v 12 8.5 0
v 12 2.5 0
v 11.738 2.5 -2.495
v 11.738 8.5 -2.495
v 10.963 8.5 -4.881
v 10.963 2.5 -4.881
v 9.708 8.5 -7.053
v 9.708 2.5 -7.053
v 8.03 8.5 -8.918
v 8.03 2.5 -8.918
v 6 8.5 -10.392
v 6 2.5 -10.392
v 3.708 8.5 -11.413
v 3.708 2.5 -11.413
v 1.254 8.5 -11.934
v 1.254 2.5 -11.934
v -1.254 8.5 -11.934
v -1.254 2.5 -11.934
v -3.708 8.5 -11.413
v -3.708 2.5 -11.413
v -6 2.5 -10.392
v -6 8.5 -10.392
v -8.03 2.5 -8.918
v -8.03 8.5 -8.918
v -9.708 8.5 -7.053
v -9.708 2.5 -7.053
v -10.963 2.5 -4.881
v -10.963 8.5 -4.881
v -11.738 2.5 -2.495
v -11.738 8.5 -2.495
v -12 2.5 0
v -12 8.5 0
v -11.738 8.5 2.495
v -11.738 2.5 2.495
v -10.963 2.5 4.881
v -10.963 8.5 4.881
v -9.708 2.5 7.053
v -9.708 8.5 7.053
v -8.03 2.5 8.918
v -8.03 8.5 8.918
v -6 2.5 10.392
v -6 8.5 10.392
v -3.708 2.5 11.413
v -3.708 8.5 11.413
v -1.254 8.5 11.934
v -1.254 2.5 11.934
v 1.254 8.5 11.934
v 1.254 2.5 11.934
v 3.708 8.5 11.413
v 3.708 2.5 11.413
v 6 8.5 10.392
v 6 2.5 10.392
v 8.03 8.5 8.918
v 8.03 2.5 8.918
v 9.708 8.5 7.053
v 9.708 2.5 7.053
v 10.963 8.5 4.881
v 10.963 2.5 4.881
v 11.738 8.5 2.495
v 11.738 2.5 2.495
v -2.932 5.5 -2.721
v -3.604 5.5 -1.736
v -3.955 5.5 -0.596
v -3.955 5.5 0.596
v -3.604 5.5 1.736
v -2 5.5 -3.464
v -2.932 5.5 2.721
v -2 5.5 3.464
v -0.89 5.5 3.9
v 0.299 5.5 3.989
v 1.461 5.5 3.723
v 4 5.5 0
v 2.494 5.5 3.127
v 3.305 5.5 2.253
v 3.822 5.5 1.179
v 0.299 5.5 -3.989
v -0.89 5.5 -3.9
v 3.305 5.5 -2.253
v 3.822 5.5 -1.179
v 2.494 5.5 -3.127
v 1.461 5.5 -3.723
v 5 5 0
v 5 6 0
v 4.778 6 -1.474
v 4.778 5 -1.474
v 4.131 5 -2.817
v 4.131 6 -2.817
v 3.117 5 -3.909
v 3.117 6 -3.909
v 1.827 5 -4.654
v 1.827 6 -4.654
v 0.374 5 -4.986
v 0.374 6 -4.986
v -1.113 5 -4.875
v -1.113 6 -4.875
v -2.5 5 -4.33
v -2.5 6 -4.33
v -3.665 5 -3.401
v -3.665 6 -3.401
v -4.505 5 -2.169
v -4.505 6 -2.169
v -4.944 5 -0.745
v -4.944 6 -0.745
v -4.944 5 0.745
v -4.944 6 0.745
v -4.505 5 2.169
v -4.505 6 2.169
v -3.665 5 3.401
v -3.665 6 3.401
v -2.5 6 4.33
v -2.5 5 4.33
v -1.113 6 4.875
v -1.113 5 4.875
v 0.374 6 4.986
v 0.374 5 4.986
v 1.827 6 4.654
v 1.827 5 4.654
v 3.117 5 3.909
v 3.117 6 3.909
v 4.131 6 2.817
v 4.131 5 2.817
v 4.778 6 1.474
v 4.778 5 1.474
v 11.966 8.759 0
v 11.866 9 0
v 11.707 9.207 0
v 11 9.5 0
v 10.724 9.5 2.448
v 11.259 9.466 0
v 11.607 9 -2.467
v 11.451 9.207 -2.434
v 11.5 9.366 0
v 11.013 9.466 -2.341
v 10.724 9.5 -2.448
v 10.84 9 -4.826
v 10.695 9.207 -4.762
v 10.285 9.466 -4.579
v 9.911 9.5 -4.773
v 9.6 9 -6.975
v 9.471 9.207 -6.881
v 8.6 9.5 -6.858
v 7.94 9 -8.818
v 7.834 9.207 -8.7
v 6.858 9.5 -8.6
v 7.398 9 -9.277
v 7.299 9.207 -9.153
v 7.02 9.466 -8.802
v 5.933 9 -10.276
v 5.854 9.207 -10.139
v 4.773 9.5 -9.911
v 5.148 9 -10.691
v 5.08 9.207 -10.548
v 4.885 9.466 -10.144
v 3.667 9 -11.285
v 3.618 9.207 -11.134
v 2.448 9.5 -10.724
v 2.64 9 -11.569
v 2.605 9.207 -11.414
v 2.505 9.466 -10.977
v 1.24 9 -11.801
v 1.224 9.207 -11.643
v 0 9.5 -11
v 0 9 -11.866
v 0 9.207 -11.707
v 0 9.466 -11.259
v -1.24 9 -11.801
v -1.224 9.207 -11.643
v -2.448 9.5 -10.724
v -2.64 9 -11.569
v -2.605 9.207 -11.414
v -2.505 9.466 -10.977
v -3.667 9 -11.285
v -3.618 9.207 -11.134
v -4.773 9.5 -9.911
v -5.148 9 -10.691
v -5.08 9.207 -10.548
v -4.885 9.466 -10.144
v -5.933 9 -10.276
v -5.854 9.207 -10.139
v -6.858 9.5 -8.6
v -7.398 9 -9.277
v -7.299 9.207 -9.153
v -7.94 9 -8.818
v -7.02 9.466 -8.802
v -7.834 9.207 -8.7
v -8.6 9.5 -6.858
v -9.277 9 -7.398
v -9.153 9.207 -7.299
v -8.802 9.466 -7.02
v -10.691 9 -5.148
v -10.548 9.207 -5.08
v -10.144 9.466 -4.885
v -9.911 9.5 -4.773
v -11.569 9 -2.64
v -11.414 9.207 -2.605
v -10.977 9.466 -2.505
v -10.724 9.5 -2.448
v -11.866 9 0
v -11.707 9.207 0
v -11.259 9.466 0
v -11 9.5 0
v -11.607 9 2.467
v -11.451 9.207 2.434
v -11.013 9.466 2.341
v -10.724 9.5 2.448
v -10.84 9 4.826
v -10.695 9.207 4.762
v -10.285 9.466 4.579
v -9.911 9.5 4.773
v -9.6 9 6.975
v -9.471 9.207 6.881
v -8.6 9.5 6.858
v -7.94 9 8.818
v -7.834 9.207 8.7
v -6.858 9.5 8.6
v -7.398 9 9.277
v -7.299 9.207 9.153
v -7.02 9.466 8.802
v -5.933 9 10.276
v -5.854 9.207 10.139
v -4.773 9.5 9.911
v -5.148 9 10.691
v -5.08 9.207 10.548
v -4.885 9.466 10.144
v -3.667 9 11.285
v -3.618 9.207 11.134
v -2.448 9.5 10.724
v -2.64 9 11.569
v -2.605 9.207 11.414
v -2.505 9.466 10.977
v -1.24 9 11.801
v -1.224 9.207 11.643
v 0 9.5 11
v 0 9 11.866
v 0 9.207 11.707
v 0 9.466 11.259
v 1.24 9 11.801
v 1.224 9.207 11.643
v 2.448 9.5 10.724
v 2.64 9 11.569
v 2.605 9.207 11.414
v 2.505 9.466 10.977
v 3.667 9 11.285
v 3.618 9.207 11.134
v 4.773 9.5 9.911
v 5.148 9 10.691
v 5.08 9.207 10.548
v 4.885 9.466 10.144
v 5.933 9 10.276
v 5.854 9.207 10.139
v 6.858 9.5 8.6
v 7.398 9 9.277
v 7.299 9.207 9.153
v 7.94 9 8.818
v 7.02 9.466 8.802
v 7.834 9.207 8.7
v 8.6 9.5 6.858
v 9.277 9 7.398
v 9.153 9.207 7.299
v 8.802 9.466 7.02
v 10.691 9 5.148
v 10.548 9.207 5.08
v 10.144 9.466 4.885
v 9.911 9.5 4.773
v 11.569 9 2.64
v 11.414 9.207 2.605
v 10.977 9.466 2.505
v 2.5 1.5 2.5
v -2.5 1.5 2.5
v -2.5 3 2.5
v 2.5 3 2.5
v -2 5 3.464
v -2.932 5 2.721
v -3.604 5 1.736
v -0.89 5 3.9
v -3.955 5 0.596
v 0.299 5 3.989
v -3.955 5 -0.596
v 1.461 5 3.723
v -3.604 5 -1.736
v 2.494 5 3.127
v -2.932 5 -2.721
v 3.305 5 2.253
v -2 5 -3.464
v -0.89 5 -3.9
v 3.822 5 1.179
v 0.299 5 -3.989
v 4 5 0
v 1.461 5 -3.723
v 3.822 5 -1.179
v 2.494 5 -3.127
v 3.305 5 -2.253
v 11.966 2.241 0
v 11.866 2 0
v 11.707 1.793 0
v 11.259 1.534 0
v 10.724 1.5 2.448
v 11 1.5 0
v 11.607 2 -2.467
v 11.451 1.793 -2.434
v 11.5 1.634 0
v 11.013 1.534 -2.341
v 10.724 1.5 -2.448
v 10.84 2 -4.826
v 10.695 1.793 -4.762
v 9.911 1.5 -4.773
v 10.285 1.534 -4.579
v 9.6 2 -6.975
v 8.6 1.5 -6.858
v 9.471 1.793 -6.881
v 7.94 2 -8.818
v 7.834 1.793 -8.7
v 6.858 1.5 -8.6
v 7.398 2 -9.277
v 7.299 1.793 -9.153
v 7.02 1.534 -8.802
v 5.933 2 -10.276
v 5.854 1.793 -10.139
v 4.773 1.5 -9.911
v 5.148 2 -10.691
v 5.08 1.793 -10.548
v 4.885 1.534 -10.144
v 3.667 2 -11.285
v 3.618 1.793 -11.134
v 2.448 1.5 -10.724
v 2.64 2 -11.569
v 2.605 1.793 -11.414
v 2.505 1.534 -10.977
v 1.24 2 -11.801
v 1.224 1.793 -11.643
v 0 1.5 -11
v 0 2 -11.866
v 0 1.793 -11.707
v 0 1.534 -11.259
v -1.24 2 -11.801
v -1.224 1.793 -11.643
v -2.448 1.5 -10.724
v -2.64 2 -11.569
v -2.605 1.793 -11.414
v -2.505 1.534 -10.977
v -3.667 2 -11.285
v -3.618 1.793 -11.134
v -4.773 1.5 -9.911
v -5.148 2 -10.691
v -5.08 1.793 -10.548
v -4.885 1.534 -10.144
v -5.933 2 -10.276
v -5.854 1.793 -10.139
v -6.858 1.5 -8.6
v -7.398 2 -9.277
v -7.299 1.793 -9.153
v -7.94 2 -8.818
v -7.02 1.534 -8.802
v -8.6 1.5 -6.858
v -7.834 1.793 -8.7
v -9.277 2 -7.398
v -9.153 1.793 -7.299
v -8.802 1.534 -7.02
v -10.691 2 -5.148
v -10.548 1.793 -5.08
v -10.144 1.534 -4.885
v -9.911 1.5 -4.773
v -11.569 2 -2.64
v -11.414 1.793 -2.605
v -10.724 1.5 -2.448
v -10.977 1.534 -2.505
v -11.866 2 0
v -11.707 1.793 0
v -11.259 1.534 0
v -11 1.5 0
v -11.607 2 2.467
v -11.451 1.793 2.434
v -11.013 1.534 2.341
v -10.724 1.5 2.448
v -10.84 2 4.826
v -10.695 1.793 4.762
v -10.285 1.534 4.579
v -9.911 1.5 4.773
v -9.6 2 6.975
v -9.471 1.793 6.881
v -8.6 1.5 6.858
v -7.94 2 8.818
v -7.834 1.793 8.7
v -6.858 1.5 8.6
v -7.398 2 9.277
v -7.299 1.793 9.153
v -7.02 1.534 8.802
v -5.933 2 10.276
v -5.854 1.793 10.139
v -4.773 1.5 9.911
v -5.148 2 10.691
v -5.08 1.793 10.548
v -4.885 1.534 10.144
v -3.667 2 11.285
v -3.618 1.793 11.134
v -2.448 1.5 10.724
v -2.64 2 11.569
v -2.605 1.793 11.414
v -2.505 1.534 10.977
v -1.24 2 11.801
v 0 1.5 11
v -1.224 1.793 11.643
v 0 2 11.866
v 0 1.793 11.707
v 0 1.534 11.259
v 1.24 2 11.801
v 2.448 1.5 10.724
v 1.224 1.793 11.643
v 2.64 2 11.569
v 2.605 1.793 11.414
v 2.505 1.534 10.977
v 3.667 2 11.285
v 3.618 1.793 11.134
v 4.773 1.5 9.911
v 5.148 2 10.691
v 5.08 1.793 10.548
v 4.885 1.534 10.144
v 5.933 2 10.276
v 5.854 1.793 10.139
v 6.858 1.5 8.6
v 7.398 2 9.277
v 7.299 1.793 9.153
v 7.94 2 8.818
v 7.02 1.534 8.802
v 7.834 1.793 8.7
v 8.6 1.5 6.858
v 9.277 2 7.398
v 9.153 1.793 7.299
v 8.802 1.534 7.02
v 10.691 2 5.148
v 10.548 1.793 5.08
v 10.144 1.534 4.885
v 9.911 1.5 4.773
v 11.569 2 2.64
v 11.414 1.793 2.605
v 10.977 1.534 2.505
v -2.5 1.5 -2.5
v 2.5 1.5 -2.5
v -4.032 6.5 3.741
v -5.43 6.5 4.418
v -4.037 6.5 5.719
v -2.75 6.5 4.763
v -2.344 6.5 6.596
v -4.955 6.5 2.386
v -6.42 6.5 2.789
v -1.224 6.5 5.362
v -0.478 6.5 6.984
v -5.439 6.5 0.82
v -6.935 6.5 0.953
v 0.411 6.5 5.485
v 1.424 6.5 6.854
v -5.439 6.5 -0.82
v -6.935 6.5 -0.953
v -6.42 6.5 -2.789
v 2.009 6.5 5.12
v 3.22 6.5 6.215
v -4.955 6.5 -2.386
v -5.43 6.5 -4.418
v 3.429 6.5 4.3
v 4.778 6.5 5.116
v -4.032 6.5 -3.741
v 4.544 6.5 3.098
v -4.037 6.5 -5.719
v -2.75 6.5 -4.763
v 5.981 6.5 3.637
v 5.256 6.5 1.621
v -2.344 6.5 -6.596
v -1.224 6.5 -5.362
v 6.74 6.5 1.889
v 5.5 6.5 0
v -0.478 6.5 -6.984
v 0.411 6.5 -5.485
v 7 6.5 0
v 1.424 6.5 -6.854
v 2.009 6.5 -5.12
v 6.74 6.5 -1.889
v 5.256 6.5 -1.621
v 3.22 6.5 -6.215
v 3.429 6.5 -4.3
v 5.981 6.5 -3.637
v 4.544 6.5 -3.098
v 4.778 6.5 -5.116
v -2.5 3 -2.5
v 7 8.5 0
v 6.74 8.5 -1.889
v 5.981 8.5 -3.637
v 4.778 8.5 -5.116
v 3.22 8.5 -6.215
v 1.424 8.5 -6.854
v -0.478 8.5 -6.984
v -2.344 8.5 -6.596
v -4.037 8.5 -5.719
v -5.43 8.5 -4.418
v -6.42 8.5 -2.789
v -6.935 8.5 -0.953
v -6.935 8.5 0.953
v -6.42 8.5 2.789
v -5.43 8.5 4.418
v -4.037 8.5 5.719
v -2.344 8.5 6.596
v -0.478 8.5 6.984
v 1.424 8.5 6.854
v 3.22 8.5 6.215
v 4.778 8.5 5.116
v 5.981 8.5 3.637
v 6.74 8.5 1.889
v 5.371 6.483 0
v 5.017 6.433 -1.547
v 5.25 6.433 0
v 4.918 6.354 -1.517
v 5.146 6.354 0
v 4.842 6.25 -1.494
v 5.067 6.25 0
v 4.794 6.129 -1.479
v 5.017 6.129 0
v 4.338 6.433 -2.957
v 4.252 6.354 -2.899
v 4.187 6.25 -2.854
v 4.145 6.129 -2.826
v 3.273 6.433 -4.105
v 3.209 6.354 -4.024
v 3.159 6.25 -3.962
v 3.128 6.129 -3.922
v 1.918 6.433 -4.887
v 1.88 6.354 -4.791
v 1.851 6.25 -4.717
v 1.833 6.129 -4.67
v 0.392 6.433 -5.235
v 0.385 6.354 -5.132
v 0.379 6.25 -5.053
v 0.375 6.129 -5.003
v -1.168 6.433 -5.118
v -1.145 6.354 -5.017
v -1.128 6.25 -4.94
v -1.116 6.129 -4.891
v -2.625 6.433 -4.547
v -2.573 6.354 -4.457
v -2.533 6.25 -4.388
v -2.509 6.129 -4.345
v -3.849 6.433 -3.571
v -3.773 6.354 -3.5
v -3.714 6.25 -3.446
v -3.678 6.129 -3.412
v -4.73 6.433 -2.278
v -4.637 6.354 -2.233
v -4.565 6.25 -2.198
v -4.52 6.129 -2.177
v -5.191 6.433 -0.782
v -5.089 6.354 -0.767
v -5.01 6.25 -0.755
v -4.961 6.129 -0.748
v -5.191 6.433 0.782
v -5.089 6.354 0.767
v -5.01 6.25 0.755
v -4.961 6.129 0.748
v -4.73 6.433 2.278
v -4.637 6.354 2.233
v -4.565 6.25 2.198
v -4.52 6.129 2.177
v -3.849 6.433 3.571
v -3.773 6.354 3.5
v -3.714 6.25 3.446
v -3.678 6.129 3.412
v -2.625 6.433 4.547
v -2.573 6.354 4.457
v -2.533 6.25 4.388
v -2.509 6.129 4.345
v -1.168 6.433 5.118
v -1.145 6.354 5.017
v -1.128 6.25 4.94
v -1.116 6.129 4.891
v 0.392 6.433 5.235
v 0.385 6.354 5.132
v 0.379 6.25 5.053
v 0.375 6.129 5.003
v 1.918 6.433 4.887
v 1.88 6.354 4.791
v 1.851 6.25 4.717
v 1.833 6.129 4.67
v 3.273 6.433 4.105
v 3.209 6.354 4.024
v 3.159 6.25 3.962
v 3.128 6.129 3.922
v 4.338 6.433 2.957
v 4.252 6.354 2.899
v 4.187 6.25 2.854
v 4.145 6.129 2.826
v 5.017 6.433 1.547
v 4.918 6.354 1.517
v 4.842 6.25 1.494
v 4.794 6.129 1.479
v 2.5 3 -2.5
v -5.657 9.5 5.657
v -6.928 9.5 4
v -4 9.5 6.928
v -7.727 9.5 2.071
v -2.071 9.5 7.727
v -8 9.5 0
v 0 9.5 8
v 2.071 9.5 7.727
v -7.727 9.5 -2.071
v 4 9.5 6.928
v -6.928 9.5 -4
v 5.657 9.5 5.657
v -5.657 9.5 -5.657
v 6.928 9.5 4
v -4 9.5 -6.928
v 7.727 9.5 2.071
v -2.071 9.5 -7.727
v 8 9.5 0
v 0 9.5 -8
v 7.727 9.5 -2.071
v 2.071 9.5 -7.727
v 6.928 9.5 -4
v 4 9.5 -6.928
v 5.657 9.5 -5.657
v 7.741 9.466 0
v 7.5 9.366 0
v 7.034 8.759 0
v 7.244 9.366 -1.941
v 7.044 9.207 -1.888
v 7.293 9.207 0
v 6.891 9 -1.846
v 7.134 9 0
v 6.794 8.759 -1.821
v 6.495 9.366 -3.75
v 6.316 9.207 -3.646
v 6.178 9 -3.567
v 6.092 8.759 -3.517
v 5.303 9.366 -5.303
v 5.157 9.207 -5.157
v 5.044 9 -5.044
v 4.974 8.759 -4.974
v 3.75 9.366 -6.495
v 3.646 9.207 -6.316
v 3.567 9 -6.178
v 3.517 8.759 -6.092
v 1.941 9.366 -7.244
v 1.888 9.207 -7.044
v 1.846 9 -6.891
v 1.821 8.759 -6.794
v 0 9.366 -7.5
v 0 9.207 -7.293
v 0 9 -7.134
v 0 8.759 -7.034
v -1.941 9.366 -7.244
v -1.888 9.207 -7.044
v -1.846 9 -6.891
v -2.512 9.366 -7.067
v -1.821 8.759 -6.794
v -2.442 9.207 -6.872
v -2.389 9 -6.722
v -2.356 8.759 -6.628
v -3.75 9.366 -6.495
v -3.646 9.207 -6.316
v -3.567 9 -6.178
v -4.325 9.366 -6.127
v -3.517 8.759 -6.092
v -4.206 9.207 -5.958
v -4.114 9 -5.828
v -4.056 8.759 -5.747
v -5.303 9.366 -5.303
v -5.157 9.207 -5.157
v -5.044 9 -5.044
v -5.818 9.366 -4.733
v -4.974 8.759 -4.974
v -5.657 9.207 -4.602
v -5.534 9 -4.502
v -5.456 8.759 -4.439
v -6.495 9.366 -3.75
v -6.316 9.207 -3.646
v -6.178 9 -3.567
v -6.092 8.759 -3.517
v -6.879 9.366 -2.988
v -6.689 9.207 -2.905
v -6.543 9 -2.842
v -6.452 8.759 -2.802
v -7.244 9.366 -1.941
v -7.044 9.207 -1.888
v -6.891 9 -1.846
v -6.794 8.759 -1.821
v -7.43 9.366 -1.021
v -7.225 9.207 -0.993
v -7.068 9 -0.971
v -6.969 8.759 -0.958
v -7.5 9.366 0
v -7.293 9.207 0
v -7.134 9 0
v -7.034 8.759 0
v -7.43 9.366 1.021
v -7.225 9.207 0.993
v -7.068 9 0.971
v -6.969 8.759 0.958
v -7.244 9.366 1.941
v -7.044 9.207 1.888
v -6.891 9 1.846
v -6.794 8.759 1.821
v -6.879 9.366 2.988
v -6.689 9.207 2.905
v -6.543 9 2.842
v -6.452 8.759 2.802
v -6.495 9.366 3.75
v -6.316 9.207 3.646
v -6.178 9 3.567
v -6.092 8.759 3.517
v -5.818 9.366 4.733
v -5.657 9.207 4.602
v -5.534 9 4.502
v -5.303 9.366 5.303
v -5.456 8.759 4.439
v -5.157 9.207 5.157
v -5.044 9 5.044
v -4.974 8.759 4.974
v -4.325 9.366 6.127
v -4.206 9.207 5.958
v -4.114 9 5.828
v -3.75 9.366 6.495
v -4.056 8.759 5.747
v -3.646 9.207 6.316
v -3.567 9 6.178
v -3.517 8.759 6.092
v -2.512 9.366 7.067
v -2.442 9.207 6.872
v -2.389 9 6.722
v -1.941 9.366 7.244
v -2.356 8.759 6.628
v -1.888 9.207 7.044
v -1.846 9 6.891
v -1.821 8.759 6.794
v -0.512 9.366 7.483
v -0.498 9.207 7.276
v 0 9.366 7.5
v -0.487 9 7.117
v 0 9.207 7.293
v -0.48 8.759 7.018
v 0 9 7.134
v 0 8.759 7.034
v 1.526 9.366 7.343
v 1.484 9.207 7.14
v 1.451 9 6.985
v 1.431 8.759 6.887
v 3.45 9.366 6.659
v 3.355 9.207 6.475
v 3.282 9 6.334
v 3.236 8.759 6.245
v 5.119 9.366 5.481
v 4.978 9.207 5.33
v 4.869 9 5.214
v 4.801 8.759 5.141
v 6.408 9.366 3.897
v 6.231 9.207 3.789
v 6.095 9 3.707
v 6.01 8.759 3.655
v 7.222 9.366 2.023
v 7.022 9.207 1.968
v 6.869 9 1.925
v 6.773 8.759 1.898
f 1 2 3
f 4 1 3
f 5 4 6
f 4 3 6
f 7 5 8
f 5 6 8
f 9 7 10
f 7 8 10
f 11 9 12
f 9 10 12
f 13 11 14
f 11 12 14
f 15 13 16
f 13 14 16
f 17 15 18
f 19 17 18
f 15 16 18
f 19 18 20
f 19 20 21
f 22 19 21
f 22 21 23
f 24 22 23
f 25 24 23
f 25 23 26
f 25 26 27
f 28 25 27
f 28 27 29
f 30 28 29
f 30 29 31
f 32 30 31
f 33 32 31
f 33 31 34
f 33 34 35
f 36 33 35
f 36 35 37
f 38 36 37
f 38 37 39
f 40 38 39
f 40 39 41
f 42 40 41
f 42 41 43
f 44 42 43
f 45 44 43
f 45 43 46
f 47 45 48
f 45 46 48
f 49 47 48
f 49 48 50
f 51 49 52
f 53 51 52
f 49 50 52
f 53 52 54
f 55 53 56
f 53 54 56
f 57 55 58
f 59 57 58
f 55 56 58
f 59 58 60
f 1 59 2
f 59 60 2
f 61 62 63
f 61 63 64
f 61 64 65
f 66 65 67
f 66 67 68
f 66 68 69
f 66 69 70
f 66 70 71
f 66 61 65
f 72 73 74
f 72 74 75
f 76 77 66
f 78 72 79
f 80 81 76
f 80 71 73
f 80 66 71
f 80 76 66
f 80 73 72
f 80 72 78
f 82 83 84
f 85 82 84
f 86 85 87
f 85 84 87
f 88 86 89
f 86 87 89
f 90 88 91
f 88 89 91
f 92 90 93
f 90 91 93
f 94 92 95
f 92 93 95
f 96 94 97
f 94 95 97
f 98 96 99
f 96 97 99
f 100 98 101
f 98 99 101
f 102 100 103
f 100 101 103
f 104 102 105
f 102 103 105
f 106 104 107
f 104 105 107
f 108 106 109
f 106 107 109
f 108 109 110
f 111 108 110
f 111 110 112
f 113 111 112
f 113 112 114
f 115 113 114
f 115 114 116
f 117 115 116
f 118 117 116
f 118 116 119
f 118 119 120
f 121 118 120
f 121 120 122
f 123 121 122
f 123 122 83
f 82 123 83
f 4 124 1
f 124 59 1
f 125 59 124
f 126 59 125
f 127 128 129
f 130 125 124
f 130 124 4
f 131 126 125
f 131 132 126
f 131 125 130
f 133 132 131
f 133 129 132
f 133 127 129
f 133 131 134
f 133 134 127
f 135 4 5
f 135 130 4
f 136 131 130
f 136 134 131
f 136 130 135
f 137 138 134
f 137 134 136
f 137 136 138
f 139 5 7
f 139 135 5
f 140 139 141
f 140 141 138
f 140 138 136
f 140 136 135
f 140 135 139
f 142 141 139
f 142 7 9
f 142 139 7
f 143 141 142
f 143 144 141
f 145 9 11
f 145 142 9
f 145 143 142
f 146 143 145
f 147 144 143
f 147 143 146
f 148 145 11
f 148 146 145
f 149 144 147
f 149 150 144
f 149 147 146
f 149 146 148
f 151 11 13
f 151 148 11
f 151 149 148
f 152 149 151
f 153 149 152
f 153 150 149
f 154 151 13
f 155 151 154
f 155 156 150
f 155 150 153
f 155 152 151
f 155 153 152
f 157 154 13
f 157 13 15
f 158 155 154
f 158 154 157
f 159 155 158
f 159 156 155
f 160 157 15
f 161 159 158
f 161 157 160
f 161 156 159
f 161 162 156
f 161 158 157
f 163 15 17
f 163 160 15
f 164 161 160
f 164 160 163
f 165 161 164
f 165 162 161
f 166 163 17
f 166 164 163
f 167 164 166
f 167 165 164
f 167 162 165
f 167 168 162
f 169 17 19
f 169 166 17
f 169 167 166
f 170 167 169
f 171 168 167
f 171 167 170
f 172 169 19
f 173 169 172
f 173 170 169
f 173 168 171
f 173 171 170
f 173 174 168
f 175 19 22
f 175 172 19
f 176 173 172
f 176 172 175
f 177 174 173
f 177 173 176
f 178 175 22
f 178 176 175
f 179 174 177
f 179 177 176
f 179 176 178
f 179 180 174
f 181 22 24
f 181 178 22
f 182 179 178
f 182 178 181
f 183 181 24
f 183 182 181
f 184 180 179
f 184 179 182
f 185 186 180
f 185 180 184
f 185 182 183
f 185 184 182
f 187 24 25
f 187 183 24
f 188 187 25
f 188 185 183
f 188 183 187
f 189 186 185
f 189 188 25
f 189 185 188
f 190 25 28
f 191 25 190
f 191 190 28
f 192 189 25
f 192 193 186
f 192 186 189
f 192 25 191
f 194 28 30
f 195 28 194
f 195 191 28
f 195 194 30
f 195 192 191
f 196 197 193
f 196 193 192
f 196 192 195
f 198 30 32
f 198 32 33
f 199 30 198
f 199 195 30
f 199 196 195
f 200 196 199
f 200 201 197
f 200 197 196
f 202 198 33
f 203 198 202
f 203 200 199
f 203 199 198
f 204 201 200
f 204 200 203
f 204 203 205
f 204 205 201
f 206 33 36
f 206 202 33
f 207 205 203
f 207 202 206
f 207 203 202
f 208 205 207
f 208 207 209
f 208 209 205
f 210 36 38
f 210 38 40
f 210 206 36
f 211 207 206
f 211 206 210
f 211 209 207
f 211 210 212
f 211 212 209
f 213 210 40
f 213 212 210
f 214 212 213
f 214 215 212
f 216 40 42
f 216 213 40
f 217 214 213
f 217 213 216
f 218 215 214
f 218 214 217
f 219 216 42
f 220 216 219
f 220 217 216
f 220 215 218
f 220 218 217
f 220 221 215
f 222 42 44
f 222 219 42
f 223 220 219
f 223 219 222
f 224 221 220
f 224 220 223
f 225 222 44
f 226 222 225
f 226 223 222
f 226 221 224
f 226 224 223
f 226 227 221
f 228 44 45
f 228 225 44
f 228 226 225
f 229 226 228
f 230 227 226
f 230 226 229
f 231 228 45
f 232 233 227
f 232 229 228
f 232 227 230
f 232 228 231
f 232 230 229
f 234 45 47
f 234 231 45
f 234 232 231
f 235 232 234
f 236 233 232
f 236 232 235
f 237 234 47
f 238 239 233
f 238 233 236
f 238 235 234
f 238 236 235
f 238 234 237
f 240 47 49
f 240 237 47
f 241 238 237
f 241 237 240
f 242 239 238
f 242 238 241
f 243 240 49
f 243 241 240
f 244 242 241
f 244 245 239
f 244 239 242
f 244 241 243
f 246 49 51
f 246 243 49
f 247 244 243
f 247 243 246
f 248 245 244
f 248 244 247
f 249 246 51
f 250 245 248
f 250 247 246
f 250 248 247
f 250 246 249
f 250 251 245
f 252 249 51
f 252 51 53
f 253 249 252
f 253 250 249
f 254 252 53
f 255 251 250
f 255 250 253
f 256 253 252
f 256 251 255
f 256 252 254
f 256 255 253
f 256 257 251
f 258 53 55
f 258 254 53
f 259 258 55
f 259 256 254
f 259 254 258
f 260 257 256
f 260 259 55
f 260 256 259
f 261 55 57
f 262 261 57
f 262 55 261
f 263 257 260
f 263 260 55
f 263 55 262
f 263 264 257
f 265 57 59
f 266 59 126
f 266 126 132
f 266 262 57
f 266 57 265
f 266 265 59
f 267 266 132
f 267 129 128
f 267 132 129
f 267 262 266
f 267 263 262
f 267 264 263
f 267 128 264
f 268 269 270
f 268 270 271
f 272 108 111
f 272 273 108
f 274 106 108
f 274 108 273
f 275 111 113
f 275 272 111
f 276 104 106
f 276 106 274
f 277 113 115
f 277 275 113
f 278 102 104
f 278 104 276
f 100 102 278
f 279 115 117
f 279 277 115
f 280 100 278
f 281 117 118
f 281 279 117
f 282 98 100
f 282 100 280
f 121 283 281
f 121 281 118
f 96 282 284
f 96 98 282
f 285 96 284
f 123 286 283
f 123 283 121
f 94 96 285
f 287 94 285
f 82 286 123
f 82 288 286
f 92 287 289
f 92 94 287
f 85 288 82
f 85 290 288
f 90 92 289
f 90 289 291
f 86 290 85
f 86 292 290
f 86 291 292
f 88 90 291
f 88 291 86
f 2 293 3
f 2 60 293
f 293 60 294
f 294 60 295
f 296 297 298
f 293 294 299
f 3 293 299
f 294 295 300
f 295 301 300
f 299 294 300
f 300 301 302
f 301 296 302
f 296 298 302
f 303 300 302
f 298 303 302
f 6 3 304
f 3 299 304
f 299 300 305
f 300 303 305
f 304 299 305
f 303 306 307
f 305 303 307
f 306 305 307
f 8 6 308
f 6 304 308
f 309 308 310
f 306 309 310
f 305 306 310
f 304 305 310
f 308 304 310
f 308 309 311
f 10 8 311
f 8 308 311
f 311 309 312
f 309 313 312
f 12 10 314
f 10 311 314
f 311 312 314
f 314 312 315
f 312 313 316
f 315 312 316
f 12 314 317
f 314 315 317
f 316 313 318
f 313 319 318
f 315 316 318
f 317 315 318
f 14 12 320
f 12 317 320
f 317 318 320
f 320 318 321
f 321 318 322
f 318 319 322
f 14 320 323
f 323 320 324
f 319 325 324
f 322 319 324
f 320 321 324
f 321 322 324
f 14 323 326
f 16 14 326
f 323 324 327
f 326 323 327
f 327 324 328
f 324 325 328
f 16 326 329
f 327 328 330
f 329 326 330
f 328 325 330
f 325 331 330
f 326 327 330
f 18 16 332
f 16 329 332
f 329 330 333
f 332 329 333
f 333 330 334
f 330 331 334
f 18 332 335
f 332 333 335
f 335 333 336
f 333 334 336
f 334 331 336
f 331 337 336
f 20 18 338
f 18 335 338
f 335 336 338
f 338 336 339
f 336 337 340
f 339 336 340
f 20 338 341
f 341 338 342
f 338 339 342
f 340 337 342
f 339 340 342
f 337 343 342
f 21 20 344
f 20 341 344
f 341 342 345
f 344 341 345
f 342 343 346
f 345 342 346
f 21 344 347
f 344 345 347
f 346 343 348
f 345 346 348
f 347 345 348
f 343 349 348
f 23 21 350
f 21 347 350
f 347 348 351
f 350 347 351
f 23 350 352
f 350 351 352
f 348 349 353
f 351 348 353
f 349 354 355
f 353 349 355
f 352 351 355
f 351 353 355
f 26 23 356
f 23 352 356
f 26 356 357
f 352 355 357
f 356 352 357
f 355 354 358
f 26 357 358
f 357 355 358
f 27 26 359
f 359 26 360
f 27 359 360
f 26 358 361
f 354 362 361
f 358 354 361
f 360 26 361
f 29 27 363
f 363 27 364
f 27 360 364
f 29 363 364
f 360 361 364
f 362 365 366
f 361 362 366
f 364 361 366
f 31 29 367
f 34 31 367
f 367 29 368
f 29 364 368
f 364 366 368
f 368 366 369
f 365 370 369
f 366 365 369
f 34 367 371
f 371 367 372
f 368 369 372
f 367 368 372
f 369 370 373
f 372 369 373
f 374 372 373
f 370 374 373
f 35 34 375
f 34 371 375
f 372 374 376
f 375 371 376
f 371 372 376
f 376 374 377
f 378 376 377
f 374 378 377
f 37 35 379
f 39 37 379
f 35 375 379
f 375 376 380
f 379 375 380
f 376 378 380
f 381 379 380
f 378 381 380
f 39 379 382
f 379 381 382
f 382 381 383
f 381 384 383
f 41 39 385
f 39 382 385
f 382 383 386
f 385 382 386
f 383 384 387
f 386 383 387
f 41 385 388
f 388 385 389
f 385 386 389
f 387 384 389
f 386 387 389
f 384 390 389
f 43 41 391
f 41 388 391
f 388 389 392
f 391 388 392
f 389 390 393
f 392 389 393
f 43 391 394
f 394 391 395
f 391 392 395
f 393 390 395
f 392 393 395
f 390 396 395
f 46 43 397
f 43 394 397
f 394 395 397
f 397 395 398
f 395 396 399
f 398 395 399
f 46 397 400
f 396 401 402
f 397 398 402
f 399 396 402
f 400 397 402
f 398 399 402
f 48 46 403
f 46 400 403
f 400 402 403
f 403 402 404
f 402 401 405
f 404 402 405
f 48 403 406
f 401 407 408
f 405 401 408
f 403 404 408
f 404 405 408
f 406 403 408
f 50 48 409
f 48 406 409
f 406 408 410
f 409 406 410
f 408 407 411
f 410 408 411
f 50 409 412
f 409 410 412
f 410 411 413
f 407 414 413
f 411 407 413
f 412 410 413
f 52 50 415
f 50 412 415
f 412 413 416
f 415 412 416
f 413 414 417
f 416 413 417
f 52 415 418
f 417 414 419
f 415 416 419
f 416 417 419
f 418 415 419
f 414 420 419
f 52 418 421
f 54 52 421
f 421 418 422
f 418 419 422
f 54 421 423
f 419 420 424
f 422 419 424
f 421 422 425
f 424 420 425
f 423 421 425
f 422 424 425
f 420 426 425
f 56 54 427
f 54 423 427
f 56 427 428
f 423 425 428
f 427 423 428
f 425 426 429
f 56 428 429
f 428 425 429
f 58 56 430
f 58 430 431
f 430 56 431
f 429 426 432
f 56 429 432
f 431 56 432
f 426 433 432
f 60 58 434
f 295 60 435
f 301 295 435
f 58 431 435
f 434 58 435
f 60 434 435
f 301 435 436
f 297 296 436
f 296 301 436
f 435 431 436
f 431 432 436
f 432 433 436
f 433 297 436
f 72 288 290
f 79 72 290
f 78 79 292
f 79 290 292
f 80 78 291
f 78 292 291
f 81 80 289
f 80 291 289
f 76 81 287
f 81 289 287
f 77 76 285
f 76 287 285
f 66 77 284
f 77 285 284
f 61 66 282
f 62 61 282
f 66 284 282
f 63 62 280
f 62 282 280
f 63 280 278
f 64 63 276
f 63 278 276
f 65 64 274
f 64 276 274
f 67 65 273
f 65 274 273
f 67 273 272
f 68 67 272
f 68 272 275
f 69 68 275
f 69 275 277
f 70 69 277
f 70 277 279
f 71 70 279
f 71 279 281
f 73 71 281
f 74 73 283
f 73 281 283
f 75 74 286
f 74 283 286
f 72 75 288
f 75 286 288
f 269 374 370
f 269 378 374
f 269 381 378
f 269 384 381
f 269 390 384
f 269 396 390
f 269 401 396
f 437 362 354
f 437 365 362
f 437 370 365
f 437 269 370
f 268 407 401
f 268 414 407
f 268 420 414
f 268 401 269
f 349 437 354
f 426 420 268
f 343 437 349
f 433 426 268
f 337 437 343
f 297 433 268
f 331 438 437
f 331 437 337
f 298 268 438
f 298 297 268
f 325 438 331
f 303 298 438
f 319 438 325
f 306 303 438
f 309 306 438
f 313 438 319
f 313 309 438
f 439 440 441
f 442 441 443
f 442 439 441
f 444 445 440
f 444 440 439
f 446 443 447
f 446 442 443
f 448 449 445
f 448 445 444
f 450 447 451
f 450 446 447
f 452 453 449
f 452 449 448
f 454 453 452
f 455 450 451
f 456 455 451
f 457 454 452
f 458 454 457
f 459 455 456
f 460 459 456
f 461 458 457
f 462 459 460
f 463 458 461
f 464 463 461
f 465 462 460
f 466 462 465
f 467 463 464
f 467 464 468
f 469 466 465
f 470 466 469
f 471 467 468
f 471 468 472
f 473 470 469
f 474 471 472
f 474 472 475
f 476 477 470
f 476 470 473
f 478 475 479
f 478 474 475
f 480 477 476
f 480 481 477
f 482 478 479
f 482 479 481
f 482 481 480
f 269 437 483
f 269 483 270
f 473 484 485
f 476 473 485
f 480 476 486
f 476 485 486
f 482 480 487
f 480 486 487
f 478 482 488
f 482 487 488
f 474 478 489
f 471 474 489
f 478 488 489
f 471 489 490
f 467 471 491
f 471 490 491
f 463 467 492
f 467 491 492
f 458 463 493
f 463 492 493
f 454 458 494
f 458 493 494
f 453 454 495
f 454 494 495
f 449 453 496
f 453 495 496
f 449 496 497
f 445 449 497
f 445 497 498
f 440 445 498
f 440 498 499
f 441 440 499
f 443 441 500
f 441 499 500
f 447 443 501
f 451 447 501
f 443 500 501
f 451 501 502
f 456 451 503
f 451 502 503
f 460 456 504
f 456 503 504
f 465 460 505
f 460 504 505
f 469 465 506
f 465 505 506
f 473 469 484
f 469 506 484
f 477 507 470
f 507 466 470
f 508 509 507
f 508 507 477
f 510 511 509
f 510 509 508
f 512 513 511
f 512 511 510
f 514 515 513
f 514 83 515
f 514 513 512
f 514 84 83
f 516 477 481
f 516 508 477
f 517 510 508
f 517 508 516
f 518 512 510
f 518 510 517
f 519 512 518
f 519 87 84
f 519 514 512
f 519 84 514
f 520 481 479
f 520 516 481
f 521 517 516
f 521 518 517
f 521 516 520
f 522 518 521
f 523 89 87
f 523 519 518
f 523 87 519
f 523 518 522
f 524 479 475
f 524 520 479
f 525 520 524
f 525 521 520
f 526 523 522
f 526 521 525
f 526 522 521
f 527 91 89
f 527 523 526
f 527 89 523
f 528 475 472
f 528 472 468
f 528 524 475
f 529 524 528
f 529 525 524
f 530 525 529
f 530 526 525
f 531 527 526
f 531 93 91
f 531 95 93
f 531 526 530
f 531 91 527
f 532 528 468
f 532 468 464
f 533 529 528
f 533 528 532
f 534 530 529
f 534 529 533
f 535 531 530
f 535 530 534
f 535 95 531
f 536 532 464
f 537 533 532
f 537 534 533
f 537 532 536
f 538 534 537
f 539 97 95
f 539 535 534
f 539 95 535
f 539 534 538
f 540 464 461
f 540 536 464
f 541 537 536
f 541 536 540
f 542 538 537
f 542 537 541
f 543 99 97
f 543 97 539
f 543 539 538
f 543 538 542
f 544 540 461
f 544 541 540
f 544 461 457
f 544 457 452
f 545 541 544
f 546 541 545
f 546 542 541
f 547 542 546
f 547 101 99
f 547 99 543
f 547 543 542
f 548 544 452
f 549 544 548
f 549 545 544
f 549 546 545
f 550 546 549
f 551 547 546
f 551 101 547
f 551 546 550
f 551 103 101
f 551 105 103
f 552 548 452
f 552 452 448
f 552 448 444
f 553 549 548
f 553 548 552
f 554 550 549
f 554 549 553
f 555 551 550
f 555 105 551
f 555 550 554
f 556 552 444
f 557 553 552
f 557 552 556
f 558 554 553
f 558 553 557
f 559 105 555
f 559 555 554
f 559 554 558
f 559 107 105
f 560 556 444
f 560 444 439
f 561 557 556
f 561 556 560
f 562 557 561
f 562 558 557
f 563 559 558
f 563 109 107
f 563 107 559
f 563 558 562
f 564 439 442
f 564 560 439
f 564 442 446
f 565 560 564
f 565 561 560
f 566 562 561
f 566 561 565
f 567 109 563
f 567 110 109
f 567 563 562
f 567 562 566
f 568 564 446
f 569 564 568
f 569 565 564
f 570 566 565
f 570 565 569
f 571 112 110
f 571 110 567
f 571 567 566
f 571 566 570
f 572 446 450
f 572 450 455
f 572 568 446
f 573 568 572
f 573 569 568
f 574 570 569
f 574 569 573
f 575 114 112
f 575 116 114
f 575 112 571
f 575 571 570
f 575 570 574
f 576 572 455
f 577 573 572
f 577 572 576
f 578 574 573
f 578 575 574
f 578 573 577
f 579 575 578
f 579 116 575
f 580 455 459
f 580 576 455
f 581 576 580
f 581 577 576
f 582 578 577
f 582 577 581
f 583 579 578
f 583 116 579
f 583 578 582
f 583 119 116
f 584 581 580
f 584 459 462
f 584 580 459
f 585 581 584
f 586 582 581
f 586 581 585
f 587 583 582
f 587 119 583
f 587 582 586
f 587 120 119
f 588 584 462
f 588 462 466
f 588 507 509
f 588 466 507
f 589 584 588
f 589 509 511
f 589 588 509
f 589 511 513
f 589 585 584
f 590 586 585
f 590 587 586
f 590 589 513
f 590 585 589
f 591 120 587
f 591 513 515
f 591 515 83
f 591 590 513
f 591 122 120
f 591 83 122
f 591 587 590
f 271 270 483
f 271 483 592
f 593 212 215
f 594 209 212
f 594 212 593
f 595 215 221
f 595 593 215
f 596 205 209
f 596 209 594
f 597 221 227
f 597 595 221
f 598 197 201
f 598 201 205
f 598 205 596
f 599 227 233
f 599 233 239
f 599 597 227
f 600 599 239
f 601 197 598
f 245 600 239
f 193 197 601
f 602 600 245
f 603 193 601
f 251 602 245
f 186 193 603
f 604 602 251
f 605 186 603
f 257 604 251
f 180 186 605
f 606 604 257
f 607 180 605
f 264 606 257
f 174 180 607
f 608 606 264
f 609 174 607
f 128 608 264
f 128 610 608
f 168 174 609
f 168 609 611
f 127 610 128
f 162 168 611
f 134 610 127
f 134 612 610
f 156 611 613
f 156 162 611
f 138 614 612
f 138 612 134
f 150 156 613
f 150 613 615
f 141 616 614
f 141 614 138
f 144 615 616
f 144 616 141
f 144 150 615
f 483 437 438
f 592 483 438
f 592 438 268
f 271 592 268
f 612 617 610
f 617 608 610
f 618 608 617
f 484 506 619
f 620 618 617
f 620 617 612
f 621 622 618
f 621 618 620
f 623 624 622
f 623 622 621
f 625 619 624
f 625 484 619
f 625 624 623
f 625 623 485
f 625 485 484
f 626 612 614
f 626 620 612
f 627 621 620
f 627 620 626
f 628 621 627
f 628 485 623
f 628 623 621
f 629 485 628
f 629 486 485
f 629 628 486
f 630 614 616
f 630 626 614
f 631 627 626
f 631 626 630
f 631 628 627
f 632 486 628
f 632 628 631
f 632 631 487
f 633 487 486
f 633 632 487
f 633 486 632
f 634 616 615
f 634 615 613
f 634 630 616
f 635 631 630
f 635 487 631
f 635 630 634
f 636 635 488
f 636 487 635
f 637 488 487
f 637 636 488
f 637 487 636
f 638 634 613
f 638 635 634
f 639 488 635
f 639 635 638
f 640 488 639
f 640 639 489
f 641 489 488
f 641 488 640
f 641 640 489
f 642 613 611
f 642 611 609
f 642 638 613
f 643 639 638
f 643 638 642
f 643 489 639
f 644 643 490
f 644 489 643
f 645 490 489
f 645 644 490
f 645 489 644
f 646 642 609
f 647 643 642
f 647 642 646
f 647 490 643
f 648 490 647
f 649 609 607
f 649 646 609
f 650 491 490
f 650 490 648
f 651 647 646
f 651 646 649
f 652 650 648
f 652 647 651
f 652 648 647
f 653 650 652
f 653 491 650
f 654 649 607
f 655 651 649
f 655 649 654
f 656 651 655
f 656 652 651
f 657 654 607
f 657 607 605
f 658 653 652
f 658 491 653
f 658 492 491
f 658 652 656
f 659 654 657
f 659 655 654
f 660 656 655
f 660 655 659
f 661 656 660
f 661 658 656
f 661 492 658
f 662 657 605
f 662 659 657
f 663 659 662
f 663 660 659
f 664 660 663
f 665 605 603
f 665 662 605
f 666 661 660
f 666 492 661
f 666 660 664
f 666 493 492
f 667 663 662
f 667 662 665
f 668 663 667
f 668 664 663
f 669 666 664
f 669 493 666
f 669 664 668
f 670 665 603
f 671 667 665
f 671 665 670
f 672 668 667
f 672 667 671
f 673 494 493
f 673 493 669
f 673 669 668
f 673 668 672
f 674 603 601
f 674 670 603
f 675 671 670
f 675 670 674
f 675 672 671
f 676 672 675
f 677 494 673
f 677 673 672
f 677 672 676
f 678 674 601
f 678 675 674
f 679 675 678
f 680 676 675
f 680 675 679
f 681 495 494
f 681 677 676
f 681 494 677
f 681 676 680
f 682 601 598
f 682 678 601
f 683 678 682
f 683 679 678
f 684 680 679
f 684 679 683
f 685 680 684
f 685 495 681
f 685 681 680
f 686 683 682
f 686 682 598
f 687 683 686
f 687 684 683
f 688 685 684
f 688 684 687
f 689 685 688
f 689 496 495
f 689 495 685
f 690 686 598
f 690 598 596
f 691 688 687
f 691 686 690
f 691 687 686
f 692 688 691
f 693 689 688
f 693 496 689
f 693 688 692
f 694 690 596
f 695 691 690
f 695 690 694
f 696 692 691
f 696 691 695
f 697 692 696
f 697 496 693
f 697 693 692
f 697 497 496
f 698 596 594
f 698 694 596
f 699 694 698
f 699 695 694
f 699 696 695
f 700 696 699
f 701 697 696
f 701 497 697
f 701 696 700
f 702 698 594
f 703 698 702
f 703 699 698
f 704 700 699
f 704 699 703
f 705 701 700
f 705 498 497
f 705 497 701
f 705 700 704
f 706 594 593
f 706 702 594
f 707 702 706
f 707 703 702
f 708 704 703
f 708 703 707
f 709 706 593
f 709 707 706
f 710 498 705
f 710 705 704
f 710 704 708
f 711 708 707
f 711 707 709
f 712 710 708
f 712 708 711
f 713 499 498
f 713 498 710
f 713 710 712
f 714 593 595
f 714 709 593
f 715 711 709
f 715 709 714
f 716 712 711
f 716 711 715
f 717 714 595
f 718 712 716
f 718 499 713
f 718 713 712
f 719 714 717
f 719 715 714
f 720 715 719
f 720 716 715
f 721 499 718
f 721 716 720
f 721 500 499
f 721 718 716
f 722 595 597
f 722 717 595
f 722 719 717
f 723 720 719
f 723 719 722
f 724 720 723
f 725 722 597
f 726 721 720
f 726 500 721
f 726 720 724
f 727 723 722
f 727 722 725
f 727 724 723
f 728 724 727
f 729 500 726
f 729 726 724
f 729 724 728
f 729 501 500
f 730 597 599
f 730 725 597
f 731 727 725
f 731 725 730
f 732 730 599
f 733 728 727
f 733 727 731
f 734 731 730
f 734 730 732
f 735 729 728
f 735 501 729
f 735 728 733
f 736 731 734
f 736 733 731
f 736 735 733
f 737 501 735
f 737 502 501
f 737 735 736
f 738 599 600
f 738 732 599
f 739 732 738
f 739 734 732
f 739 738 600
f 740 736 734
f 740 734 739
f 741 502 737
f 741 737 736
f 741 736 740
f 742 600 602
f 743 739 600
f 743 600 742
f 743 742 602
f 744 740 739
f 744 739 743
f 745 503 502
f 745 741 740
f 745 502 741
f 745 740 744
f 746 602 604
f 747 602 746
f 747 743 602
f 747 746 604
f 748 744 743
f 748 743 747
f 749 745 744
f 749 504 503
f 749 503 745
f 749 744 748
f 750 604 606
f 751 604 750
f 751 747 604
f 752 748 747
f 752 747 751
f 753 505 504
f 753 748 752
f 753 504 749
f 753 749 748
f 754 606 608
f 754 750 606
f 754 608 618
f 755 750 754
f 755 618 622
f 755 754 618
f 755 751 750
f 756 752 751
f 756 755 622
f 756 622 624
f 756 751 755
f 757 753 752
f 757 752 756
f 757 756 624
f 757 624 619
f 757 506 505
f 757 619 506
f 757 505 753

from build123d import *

# Parameters (mm, degrees)
SKETCH_1_W          = 40
SKETCH_1_H          = 15
EXTRUDE_1_DEPTH     = 1.5
SKETCH_2_R          = 12
EXTRUDE_2_DEPTH     = 8
SKETCH_3_R          = 7
SKETCH_3_R_2        = 5
CUT_EXTRUDE_1_DEPTH = 3
SKETCH_4_R          = 5
CUT_EXTRUDE_2_DEPTH = 4.5
SKETCH_5_R          = 4
EXTRUDE_3_DEPTH     = 0.5
FILLET_3_R          = 1
FILLET_5_R          = 0.5
SKETCH_6_W          = 15
SKETCH_6_H          = 1.5
CUT_EXTRUDE_3_DEPTH = 41
FILLET_6_R          = 1
SKETCH_7_W          = 5
SKETCH_7_H          = 5
CUT_EXTRUDE_4_DEPTH = 1.5


with BuildPart() as part:
    # 草图1 → 凸台-拉伸1 (new body)
    with BuildSketch(Plane(origin=(0, 0, 0), x_dir=(1, 0, 0), z_dir=(0, 1, 0))):
        Rectangle(SKETCH_1_W, SKETCH_1_H)
    extrude(amount=EXTRUDE_1_DEPTH)

    # 草图2 → 凸台-拉伸2 (add)
    with BuildSketch(Plane(origin=(0, 1.5, 0), x_dir=(1, 0, 0), z_dir=(0, 1, 0))):
        Circle(SKETCH_2_R)
    extrude(amount=EXTRUDE_2_DEPTH)

    # 草图3 → 切除-拉伸1 (cut)
    with BuildSketch(Plane(origin=(0, 9.5, 0), x_dir=(1, 0, 0), z_dir=(0, 1, 0))):
        Circle(SKETCH_3_R)
        Circle(SKETCH_3_R_2, mode=Mode.SUBTRACT)
    extrude(amount=-CUT_EXTRUDE_1_DEPTH, mode=Mode.SUBTRACT)

    # 草图4 → 切除-拉伸2 (cut)
    with BuildSketch(Plane(origin=(0, 9.5, 0), x_dir=(1, 0, 0), z_dir=(0, 1, 0))):
        Circle(SKETCH_4_R)
    extrude(amount=-CUT_EXTRUDE_2_DEPTH, mode=Mode.SUBTRACT)

    # 草图5 → 凸台-拉伸3 (add)
    with BuildSketch(Plane(origin=(0, 5, 0), x_dir=(1, 0, 0), z_dir=(0, 1, 0))):
        Circle(SKETCH_5_R)
    extrude(amount=EXTRUDE_3_DEPTH)

    # 圆角3
    fillet_3_edges = [part.edges().sort_by_distance(p)[0] for p in [
        (-12, 9.5, 0),
        (-7, 9.5, 0),
    ]]
    fillet(fillet_3_edges, radius=FILLET_3_R)

    # 圆角5
    fillet_5_edges = [part.edges().sort_by_distance(p)[0] for p in [
        (-5, 6.5, 0),
    ]]
    fillet(fillet_5_edges, radius=FILLET_5_R)

    # 草图6 → 切除-拉伸3 (cut, through all)
    with BuildSketch(Plane(origin=(20, 0, 0), x_dir=(0, 0, -1), z_dir=(1, 0, 0))):
        with Locations((0, 0.75)):
            Rectangle(SKETCH_6_W, SKETCH_6_H)
    extrude(amount=-CUT_EXTRUDE_3_DEPTH, mode=Mode.SUBTRACT)

    # 圆角6
    fillet_6_edges = [part.edges().sort_by_distance(p)[0] for p in [
        (-12, 1.5, 0),
    ]]
    fillet(fillet_6_edges, radius=FILLET_6_R)

    # 草图7 → 切除-拉伸4 (cut)
    with BuildSketch(Plane.XZ.offset(-1.5)):
        Rectangle(SKETCH_7_W, SKETCH_7_H)
    extrude(amount=-CUT_EXTRUDE_4_DEPTH, mode=Mode.SUBTRACT)


solid = part.part
